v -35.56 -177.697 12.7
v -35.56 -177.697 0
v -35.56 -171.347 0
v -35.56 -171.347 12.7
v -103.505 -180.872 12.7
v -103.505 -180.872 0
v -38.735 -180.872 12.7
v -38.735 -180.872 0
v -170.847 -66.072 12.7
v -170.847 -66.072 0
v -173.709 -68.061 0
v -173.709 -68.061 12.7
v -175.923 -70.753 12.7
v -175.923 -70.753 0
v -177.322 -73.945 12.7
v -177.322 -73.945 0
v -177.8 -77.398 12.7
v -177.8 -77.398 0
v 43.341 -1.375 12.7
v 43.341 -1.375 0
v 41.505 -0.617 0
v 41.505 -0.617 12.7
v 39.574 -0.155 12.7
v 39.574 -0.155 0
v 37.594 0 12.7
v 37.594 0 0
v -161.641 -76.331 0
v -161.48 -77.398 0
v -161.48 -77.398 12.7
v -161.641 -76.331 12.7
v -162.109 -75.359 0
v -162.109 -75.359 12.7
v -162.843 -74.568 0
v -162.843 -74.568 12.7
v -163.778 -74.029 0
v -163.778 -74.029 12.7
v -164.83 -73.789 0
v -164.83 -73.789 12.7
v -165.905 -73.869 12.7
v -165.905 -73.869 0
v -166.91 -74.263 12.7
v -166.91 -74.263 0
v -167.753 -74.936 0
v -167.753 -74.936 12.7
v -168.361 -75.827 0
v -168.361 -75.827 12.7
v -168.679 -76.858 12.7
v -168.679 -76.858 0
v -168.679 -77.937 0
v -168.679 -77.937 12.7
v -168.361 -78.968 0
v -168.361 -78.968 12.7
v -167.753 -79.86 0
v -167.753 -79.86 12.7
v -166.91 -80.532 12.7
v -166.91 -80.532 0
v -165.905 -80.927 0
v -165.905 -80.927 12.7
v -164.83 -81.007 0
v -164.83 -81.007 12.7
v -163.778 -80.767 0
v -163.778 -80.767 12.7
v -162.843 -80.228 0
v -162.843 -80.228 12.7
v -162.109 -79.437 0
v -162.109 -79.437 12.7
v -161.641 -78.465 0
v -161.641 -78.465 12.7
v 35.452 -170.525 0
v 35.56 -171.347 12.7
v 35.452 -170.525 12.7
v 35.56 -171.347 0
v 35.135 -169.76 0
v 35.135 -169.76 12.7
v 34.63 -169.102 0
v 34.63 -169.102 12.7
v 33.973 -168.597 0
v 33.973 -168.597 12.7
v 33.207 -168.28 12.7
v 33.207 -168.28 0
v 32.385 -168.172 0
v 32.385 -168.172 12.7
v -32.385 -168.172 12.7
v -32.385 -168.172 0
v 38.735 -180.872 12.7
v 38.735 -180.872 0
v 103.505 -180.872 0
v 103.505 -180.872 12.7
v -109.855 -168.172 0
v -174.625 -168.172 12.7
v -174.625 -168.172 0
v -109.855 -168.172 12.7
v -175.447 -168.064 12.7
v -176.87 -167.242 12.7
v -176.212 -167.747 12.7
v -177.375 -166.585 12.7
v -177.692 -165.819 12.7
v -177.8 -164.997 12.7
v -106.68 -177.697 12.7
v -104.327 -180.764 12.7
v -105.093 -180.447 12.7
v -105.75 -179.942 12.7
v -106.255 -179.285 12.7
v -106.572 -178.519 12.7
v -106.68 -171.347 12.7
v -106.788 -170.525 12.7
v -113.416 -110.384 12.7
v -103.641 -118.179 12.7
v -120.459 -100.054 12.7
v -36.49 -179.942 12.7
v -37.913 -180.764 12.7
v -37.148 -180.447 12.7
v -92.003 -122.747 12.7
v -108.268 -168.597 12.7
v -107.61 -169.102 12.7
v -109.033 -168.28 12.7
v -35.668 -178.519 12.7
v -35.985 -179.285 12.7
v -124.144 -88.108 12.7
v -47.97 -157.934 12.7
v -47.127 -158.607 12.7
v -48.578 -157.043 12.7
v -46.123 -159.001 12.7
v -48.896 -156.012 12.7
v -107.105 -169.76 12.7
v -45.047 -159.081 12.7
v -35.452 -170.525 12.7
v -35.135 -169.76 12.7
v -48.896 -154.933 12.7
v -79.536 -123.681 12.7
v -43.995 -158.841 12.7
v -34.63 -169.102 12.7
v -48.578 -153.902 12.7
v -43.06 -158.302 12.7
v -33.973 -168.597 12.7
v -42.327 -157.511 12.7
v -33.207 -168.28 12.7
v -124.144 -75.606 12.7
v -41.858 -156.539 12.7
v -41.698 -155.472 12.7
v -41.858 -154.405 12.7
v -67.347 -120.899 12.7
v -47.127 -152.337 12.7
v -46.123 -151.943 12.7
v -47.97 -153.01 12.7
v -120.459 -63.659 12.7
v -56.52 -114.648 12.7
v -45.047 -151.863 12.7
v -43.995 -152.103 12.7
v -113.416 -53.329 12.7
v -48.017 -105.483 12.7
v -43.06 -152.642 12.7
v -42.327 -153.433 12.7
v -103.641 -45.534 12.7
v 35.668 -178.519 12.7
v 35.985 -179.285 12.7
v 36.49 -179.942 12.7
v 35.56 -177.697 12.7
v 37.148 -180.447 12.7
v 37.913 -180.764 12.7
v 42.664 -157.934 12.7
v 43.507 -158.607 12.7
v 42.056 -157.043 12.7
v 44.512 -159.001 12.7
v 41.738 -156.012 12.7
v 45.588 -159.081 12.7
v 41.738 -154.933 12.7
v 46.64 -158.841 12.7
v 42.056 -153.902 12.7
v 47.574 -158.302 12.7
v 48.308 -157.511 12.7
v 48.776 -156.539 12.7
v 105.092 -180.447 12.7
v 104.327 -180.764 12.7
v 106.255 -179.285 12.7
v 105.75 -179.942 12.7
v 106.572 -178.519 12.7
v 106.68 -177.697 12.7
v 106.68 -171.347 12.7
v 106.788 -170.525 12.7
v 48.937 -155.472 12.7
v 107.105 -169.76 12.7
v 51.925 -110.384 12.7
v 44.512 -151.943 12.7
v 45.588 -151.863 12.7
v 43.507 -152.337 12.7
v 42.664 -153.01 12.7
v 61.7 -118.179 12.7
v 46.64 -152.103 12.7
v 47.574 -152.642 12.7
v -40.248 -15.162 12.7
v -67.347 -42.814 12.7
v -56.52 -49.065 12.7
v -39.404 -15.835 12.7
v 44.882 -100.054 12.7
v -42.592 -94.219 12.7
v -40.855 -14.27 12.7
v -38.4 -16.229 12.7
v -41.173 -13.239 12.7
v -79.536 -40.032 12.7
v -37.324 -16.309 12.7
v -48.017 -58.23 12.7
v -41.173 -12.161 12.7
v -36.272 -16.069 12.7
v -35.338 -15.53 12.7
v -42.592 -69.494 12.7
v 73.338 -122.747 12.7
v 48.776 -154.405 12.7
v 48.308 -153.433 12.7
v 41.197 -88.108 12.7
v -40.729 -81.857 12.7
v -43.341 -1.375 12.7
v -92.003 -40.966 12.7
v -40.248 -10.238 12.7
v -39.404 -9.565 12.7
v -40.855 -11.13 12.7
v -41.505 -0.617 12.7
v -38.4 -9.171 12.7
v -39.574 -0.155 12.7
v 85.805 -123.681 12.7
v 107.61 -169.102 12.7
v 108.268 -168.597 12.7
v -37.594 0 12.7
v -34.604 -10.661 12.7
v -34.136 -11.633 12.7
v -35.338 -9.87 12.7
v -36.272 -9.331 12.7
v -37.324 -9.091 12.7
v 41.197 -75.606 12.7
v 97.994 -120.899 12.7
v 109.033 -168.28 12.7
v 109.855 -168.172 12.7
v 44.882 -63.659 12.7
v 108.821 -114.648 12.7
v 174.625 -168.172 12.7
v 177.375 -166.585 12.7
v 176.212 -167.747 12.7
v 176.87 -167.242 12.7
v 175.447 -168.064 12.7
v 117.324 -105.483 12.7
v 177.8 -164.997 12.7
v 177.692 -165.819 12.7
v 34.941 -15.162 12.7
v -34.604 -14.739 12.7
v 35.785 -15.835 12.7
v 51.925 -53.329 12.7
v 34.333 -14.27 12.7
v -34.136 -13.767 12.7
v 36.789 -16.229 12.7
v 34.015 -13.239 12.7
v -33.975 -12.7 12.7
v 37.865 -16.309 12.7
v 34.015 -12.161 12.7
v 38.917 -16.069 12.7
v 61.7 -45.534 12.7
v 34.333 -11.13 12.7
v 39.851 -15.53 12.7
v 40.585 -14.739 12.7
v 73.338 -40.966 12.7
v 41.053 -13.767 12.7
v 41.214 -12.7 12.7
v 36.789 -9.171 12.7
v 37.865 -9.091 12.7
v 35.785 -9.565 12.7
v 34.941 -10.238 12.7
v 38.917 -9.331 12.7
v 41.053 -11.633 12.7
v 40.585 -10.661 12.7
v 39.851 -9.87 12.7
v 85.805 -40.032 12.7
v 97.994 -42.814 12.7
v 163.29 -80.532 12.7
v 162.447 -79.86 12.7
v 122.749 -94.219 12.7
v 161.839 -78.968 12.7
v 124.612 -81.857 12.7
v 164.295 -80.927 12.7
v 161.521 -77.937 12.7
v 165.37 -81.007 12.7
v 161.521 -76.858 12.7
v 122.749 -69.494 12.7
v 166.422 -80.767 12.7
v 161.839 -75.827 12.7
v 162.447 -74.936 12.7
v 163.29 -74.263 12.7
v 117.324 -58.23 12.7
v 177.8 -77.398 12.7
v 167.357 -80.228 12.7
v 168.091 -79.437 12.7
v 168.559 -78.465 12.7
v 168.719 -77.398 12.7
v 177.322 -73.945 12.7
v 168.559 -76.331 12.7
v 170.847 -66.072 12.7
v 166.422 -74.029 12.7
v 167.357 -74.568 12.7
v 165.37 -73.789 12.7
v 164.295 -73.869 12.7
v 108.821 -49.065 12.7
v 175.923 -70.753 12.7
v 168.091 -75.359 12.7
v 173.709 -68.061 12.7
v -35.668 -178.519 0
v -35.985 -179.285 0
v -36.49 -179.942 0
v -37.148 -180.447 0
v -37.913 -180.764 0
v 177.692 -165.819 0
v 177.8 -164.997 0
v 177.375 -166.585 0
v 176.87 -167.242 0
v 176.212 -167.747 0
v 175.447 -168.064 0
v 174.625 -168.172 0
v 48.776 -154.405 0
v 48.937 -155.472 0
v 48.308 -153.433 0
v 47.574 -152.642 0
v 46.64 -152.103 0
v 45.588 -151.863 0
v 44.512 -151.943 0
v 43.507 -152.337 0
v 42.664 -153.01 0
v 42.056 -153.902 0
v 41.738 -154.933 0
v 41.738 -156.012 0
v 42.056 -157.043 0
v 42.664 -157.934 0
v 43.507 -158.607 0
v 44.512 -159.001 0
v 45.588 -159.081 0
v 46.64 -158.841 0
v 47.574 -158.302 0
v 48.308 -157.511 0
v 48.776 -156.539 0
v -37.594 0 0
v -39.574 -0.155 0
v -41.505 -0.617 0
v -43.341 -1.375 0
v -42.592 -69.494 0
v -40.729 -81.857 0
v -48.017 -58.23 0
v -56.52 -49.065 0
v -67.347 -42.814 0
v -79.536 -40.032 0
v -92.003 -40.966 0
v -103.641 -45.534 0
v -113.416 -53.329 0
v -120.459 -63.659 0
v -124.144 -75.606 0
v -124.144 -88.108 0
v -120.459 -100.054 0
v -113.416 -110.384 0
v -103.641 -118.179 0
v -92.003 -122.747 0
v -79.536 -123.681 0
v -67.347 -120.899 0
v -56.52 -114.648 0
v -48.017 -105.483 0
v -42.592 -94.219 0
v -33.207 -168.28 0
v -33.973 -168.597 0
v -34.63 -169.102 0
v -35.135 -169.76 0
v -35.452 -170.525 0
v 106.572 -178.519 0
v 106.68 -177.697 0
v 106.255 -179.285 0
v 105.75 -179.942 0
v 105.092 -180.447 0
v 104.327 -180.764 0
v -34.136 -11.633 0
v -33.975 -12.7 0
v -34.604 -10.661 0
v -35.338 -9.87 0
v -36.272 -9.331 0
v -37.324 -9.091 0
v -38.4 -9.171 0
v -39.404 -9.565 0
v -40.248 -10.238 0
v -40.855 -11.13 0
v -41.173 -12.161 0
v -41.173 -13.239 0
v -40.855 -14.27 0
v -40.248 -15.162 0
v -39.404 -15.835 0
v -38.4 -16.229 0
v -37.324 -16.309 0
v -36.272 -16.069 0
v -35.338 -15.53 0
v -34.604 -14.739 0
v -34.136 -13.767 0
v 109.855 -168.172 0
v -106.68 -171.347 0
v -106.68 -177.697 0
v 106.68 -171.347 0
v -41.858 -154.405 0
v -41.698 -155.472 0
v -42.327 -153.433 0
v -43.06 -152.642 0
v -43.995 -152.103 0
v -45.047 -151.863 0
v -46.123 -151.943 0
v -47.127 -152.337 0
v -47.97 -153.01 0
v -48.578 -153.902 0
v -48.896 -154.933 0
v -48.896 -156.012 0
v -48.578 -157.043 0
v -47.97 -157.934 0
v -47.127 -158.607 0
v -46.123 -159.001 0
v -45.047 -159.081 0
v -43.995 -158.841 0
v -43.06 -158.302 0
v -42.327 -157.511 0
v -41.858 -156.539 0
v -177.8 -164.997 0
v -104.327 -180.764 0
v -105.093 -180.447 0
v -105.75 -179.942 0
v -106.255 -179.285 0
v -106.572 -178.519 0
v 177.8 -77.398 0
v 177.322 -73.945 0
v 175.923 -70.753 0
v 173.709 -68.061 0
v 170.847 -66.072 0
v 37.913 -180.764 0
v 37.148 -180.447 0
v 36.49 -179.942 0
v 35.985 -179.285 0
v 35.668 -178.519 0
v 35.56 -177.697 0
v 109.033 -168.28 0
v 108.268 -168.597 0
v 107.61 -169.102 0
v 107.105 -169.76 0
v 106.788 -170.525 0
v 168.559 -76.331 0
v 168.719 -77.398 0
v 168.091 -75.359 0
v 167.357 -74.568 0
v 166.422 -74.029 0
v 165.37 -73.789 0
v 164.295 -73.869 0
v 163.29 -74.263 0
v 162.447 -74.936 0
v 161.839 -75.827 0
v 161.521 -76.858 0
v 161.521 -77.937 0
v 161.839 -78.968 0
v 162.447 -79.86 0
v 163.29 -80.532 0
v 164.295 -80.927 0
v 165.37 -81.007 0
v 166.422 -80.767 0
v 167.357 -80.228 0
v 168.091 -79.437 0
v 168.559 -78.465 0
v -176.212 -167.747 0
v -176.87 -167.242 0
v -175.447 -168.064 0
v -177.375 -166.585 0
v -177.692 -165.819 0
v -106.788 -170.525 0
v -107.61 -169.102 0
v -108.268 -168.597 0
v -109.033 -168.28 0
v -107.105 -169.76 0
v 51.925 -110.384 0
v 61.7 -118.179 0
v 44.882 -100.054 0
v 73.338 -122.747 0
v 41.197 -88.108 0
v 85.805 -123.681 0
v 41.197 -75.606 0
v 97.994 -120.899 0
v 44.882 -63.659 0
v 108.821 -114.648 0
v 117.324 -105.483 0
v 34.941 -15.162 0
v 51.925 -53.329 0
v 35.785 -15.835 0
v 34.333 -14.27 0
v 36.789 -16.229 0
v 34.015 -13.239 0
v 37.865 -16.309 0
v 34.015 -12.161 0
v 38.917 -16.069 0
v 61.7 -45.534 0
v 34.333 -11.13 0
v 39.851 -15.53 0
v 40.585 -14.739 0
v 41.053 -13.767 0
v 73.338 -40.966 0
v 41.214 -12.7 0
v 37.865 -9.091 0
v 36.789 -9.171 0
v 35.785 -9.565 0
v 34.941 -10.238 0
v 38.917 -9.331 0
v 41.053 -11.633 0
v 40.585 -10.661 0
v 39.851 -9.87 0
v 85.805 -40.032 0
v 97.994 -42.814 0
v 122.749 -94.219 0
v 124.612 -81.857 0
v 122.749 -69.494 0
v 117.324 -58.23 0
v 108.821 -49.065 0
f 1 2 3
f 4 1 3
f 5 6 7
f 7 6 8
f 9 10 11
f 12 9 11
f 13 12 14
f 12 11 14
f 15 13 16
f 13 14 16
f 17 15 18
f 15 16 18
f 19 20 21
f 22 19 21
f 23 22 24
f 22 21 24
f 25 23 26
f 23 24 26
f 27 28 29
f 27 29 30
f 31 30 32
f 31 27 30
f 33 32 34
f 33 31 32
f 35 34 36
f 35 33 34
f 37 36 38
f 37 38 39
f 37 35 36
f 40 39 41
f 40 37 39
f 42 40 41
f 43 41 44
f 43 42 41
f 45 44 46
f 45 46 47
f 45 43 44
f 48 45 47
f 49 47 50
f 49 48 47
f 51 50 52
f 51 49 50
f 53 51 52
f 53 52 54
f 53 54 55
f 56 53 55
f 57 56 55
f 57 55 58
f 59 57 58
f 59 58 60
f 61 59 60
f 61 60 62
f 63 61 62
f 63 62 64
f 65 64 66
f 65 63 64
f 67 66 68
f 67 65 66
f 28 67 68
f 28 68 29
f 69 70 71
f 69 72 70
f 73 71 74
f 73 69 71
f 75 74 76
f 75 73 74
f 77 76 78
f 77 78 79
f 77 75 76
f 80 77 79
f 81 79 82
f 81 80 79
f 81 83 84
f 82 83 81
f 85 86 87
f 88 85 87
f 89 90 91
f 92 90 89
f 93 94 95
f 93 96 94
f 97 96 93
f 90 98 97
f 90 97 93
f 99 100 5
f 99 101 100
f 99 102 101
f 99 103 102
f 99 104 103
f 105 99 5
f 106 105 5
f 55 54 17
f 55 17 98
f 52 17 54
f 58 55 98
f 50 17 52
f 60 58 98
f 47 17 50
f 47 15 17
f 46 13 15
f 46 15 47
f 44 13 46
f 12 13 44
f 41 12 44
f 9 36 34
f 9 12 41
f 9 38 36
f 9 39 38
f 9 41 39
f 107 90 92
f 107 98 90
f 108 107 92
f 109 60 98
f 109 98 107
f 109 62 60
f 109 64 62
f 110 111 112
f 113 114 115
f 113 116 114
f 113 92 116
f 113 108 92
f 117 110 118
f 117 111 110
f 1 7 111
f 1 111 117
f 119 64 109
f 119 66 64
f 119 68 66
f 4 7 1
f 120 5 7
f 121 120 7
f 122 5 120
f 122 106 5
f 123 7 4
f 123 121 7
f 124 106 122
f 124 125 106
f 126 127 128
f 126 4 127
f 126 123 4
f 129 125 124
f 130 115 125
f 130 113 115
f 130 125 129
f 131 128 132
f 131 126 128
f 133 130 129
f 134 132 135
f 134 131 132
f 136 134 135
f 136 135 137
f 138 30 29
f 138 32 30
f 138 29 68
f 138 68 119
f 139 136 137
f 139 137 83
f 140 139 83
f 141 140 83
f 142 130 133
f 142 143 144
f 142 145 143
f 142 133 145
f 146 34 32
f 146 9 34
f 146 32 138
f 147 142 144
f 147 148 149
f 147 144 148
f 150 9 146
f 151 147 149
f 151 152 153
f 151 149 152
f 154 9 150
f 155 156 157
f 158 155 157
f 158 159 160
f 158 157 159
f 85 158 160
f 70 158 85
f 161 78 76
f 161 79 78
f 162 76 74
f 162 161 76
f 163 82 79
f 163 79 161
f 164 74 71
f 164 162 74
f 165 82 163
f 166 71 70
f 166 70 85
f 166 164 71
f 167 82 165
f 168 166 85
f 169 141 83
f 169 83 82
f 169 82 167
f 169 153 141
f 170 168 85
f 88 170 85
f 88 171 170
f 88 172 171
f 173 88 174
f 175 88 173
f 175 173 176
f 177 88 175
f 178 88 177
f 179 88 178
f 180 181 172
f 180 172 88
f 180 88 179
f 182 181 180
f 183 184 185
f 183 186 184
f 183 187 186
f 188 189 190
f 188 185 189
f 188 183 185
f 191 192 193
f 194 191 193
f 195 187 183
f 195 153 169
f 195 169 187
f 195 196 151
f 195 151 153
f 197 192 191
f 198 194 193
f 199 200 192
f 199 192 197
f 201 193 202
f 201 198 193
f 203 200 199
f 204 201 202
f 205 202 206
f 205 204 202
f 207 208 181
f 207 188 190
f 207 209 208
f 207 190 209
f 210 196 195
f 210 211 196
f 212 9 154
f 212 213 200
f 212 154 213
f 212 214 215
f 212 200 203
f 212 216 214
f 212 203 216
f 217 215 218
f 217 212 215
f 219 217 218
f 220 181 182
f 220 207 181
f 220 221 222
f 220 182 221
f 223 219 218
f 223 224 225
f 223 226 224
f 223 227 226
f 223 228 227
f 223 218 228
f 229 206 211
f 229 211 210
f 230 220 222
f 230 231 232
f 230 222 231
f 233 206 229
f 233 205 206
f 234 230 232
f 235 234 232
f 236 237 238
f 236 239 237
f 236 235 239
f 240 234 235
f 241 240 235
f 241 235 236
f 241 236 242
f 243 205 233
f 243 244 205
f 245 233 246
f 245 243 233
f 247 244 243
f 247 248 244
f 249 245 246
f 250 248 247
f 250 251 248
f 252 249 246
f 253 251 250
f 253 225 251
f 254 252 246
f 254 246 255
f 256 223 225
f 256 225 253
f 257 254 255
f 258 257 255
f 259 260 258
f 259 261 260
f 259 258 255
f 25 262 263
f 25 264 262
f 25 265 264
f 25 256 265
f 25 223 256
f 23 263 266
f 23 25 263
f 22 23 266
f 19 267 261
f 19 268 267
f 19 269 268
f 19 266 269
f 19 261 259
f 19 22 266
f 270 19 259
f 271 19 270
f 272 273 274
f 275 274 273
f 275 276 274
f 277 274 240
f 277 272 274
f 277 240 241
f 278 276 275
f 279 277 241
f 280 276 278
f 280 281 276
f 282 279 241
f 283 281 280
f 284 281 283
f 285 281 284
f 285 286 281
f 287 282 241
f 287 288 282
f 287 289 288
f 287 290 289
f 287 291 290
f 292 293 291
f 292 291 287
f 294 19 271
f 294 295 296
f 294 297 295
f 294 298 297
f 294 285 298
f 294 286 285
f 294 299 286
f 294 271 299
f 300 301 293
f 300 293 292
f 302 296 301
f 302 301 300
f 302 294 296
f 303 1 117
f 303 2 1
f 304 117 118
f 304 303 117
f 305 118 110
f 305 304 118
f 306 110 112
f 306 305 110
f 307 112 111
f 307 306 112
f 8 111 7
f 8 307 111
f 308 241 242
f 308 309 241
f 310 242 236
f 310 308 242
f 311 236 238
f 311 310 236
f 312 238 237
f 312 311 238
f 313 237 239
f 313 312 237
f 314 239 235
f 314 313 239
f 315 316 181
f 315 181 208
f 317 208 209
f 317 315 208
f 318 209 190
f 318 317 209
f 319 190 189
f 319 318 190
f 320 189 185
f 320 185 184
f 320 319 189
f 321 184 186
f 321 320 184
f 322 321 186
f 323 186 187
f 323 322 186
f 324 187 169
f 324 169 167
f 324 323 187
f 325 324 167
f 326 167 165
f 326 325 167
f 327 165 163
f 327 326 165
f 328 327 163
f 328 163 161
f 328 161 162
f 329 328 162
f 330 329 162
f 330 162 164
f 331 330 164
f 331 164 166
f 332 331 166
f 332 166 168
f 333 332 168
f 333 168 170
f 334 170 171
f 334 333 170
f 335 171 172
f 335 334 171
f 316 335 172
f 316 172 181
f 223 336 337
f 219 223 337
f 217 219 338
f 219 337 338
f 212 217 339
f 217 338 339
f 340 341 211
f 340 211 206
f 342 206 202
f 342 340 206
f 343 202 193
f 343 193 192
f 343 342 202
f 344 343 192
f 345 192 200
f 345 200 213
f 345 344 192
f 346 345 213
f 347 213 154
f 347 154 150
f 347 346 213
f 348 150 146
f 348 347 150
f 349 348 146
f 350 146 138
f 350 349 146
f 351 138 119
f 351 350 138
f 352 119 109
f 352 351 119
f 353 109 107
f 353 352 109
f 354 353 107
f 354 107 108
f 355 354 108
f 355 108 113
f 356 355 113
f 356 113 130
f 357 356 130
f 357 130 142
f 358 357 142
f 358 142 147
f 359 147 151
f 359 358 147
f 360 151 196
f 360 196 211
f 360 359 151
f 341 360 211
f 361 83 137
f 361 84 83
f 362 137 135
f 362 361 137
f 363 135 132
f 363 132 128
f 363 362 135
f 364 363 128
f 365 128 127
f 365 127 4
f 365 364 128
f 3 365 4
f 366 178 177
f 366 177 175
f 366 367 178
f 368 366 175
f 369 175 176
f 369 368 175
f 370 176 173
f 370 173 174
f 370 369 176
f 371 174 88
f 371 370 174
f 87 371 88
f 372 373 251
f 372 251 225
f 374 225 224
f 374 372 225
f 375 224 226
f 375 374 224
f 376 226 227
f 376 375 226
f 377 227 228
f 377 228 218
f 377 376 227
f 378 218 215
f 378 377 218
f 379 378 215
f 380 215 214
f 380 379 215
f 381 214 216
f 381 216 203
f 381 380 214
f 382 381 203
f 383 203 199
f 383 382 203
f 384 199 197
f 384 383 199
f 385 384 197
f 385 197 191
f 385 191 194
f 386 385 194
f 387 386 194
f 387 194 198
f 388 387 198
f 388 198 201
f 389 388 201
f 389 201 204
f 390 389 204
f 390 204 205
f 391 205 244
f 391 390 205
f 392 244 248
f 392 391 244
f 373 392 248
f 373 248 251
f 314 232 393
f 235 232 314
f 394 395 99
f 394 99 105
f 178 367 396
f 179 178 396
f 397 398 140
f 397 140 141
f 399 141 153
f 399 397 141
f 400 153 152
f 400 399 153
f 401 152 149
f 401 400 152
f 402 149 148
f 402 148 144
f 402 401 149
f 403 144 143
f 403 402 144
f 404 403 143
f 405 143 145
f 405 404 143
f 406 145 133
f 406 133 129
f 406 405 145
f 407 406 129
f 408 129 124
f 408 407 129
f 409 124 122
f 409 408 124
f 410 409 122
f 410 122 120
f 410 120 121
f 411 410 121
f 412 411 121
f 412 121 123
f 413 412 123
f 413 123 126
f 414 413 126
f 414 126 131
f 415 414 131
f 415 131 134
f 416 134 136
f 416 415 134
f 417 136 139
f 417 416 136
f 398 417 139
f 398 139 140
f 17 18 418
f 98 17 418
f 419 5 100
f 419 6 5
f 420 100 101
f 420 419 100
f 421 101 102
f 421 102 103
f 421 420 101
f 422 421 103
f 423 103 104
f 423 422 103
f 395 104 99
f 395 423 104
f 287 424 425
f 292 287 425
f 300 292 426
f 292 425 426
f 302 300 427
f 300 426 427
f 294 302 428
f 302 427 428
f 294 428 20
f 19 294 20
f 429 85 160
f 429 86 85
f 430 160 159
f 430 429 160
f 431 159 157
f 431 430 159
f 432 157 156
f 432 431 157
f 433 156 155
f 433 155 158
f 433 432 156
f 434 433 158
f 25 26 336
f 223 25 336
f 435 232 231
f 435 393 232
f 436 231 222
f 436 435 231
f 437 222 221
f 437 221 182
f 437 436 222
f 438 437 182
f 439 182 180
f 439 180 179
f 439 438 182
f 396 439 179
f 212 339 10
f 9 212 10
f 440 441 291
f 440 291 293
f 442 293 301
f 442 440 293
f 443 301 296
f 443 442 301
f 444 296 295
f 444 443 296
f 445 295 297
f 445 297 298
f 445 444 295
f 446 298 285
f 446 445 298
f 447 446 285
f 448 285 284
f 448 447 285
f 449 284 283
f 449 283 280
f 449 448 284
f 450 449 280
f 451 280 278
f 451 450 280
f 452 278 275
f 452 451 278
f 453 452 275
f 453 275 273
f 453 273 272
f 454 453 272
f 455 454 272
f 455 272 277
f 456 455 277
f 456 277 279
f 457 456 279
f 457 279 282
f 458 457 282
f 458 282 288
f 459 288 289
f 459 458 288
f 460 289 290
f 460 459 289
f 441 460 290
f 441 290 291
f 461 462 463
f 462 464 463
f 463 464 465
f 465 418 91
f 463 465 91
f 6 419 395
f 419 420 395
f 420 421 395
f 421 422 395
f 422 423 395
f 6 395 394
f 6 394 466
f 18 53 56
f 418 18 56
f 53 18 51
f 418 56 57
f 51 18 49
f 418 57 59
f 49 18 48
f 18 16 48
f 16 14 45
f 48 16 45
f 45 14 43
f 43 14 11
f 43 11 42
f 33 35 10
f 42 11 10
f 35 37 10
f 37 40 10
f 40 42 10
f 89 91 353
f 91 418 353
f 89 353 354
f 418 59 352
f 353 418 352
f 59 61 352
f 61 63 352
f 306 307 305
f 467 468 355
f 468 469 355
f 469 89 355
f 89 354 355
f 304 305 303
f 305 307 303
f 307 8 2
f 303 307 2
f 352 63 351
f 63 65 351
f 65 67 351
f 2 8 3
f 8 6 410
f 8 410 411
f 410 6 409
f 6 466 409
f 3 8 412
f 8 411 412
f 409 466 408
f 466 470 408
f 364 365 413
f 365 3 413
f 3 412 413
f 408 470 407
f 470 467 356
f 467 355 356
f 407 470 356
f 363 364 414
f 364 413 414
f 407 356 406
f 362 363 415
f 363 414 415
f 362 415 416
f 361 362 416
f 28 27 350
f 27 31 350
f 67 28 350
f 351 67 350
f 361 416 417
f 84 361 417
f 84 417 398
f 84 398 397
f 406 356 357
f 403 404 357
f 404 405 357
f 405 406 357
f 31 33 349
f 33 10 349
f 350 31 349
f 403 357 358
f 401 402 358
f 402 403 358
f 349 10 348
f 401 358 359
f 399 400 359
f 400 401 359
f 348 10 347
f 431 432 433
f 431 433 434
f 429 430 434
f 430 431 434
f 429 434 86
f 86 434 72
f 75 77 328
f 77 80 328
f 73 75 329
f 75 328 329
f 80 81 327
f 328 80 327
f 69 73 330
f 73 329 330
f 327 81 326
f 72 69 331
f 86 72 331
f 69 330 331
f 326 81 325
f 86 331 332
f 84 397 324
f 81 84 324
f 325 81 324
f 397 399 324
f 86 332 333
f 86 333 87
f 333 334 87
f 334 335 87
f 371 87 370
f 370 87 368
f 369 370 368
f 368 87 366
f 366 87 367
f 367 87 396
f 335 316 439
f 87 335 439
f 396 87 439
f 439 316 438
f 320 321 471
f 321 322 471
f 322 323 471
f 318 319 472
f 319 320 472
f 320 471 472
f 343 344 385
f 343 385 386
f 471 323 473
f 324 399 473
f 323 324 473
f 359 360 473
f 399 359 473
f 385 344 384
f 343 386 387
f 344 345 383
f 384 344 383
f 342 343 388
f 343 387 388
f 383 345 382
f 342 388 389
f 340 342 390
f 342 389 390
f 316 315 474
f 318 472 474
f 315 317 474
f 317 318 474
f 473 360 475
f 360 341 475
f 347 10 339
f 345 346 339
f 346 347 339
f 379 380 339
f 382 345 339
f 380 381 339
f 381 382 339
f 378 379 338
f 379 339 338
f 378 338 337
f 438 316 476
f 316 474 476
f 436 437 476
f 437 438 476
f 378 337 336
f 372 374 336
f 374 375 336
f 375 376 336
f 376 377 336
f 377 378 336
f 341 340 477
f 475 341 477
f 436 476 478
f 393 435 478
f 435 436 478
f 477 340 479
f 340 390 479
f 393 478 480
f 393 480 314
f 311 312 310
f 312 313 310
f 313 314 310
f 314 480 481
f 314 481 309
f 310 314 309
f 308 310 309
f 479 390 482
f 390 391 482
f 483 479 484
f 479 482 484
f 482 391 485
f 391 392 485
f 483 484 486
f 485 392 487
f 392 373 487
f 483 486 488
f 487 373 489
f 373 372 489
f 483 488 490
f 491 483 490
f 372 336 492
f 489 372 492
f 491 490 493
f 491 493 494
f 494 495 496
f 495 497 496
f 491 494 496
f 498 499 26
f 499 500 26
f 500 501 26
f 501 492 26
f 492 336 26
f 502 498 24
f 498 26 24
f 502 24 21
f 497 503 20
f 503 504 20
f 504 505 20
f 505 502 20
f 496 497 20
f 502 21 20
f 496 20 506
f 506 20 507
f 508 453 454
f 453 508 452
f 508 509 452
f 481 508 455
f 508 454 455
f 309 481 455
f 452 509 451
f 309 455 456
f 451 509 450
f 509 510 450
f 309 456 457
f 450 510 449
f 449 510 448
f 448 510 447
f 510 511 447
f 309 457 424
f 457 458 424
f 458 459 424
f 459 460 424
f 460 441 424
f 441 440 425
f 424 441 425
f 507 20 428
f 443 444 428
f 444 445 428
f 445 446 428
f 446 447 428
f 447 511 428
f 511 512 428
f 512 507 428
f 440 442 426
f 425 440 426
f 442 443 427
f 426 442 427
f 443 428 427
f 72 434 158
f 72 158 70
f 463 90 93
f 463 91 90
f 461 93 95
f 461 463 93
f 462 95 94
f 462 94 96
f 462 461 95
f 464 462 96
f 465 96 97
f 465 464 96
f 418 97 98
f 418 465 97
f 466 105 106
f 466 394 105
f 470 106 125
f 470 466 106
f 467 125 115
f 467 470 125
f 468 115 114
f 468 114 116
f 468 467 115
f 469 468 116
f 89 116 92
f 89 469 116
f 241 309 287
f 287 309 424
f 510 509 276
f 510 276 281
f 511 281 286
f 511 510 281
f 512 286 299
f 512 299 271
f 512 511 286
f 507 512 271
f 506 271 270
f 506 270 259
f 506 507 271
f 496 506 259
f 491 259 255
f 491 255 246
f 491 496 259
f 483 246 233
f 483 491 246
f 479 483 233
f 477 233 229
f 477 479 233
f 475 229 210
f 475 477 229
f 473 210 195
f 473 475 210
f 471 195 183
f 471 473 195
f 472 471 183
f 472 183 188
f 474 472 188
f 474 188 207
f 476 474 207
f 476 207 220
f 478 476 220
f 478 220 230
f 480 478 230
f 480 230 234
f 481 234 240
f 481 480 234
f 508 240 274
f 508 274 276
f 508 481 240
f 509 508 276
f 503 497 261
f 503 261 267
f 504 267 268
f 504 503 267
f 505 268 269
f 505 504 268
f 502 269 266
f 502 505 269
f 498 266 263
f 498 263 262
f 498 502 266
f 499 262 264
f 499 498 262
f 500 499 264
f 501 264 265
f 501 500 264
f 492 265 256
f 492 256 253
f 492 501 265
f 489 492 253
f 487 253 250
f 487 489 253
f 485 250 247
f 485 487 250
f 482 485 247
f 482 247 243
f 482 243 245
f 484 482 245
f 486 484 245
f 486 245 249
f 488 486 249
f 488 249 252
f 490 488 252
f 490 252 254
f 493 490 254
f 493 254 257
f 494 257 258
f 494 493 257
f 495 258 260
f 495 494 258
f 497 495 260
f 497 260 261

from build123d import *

# Parameters (mm, degrees)
F0_R     = 3.6195
F0_R_2   = 41.94175
F1_DEPTH = 12.7
F2_W     = 71.12
F2_H     = 12.7
F3_DEPTH = 12.7
F4_R     = 3.175


with BuildPart() as f1:
    # F0 (on Top) → F1 (new body)
    with BuildSketch(Plane.XY):
        with BuildLine():
            Line((37.5943482574, 0), (-37.5943482574, 0))
            ThreePointArc((-37.5943482574, 0), (-40.5487339943, -0.3484169064), (-43.3410161187, -1.3745504066))
            Line((-43.3410161187, -1.3745504066), (-170.8466678613, -66.0724350219))
            ThreePointArc((-170.8466678614, -66.0724350219), (-175.9229543527, -70.7530626401), (-177.8, -77.3978846153))
            Line((-177.8, -77.3978846153), (-177.8, -180.8720758428))
            Line((-177.8, -180.8720758428), (177.8, -180.8720758428))
            Line((177.8, -180.8720758428), (177.8, -77.3978846153))
            ThreePointArc((177.8, -77.3978846153), (175.9229543526, -70.7530626402), (170.8466678613, -66.0724350219))
            Line((170.8466678613, -66.0724350219), (43.3410161187, -1.3745504066))
            ThreePointArc((43.3410161187, -1.3745504066), (40.5487339943, -0.3484169064), (37.5943482574, 0))
        make_face()
        with Locations((-45.3171624807, -155.4720758428)):
            Circle(F0_R, mode=Mode.SUBTRACT)
        with Locations((45.3171624807, -155.4720758428)):
            Circle(F0_R, mode=Mode.SUBTRACT)
        with Locations((-165.1, -77.3978846153)):
            Circle(F0_R, mode=Mode.SUBTRACT)
        with Locations((-82.6705035794, -81.856653486)):
            Circle(F0_R_2, mode=Mode.SUBTRACT)
        with Locations((-37.5943482574, -12.7)):
            Circle(F0_R, mode=Mode.SUBTRACT)
        with Locations((82.6705035794, -81.856653486)):
            Circle(F0_R_2, mode=Mode.SUBTRACT)
        with Locations((165.1, -77.3978846153)):
            Circle(F0_R, mode=Mode.SUBTRACT)
        with Locations((37.5943482574, -12.7)):
            Circle(F0_R, mode=Mode.SUBTRACT)
    extrude(amount=F1_DEPTH)

    # F2 (on face) → F3 (cut, through all)
    with BuildSketch(Plane.XY.offset(12.7)):
        with Locations((-142.24, -174.5220758428)):
            Rectangle(F2_W, F2_H)
        with Locations((142.24, -174.5220758428)):
            Rectangle(F2_W, F2_H)
        with Locations((0, -174.5220758428)):
            Rectangle(F2_W, F2_H)
    extrude(amount=-F3_DEPTH, mode=Mode.SUBTRACT)

    # F4
    f4_edges = [f1.edges().sort_by_distance(p)[0] for p in [
        (-177.8, -168.172076, 6.35),
        (-106.68, -168.172076, 6.35),
        (-35.56, -168.172076, 6.35),
        (35.56, -168.172076, 6.35),
        (106.68, -168.172076, 6.35),
        (177.8, -168.172076, 6.35),
        (-106.68, -180.872076, 6.35),
        (-35.56, -180.872076, 6.35),
        (35.56, -180.872076, 6.35),
        (106.68, -180.872076, 6.35),
    ]]
    fillet(f4_edges, radius=F4_R)


solid = f1.part
